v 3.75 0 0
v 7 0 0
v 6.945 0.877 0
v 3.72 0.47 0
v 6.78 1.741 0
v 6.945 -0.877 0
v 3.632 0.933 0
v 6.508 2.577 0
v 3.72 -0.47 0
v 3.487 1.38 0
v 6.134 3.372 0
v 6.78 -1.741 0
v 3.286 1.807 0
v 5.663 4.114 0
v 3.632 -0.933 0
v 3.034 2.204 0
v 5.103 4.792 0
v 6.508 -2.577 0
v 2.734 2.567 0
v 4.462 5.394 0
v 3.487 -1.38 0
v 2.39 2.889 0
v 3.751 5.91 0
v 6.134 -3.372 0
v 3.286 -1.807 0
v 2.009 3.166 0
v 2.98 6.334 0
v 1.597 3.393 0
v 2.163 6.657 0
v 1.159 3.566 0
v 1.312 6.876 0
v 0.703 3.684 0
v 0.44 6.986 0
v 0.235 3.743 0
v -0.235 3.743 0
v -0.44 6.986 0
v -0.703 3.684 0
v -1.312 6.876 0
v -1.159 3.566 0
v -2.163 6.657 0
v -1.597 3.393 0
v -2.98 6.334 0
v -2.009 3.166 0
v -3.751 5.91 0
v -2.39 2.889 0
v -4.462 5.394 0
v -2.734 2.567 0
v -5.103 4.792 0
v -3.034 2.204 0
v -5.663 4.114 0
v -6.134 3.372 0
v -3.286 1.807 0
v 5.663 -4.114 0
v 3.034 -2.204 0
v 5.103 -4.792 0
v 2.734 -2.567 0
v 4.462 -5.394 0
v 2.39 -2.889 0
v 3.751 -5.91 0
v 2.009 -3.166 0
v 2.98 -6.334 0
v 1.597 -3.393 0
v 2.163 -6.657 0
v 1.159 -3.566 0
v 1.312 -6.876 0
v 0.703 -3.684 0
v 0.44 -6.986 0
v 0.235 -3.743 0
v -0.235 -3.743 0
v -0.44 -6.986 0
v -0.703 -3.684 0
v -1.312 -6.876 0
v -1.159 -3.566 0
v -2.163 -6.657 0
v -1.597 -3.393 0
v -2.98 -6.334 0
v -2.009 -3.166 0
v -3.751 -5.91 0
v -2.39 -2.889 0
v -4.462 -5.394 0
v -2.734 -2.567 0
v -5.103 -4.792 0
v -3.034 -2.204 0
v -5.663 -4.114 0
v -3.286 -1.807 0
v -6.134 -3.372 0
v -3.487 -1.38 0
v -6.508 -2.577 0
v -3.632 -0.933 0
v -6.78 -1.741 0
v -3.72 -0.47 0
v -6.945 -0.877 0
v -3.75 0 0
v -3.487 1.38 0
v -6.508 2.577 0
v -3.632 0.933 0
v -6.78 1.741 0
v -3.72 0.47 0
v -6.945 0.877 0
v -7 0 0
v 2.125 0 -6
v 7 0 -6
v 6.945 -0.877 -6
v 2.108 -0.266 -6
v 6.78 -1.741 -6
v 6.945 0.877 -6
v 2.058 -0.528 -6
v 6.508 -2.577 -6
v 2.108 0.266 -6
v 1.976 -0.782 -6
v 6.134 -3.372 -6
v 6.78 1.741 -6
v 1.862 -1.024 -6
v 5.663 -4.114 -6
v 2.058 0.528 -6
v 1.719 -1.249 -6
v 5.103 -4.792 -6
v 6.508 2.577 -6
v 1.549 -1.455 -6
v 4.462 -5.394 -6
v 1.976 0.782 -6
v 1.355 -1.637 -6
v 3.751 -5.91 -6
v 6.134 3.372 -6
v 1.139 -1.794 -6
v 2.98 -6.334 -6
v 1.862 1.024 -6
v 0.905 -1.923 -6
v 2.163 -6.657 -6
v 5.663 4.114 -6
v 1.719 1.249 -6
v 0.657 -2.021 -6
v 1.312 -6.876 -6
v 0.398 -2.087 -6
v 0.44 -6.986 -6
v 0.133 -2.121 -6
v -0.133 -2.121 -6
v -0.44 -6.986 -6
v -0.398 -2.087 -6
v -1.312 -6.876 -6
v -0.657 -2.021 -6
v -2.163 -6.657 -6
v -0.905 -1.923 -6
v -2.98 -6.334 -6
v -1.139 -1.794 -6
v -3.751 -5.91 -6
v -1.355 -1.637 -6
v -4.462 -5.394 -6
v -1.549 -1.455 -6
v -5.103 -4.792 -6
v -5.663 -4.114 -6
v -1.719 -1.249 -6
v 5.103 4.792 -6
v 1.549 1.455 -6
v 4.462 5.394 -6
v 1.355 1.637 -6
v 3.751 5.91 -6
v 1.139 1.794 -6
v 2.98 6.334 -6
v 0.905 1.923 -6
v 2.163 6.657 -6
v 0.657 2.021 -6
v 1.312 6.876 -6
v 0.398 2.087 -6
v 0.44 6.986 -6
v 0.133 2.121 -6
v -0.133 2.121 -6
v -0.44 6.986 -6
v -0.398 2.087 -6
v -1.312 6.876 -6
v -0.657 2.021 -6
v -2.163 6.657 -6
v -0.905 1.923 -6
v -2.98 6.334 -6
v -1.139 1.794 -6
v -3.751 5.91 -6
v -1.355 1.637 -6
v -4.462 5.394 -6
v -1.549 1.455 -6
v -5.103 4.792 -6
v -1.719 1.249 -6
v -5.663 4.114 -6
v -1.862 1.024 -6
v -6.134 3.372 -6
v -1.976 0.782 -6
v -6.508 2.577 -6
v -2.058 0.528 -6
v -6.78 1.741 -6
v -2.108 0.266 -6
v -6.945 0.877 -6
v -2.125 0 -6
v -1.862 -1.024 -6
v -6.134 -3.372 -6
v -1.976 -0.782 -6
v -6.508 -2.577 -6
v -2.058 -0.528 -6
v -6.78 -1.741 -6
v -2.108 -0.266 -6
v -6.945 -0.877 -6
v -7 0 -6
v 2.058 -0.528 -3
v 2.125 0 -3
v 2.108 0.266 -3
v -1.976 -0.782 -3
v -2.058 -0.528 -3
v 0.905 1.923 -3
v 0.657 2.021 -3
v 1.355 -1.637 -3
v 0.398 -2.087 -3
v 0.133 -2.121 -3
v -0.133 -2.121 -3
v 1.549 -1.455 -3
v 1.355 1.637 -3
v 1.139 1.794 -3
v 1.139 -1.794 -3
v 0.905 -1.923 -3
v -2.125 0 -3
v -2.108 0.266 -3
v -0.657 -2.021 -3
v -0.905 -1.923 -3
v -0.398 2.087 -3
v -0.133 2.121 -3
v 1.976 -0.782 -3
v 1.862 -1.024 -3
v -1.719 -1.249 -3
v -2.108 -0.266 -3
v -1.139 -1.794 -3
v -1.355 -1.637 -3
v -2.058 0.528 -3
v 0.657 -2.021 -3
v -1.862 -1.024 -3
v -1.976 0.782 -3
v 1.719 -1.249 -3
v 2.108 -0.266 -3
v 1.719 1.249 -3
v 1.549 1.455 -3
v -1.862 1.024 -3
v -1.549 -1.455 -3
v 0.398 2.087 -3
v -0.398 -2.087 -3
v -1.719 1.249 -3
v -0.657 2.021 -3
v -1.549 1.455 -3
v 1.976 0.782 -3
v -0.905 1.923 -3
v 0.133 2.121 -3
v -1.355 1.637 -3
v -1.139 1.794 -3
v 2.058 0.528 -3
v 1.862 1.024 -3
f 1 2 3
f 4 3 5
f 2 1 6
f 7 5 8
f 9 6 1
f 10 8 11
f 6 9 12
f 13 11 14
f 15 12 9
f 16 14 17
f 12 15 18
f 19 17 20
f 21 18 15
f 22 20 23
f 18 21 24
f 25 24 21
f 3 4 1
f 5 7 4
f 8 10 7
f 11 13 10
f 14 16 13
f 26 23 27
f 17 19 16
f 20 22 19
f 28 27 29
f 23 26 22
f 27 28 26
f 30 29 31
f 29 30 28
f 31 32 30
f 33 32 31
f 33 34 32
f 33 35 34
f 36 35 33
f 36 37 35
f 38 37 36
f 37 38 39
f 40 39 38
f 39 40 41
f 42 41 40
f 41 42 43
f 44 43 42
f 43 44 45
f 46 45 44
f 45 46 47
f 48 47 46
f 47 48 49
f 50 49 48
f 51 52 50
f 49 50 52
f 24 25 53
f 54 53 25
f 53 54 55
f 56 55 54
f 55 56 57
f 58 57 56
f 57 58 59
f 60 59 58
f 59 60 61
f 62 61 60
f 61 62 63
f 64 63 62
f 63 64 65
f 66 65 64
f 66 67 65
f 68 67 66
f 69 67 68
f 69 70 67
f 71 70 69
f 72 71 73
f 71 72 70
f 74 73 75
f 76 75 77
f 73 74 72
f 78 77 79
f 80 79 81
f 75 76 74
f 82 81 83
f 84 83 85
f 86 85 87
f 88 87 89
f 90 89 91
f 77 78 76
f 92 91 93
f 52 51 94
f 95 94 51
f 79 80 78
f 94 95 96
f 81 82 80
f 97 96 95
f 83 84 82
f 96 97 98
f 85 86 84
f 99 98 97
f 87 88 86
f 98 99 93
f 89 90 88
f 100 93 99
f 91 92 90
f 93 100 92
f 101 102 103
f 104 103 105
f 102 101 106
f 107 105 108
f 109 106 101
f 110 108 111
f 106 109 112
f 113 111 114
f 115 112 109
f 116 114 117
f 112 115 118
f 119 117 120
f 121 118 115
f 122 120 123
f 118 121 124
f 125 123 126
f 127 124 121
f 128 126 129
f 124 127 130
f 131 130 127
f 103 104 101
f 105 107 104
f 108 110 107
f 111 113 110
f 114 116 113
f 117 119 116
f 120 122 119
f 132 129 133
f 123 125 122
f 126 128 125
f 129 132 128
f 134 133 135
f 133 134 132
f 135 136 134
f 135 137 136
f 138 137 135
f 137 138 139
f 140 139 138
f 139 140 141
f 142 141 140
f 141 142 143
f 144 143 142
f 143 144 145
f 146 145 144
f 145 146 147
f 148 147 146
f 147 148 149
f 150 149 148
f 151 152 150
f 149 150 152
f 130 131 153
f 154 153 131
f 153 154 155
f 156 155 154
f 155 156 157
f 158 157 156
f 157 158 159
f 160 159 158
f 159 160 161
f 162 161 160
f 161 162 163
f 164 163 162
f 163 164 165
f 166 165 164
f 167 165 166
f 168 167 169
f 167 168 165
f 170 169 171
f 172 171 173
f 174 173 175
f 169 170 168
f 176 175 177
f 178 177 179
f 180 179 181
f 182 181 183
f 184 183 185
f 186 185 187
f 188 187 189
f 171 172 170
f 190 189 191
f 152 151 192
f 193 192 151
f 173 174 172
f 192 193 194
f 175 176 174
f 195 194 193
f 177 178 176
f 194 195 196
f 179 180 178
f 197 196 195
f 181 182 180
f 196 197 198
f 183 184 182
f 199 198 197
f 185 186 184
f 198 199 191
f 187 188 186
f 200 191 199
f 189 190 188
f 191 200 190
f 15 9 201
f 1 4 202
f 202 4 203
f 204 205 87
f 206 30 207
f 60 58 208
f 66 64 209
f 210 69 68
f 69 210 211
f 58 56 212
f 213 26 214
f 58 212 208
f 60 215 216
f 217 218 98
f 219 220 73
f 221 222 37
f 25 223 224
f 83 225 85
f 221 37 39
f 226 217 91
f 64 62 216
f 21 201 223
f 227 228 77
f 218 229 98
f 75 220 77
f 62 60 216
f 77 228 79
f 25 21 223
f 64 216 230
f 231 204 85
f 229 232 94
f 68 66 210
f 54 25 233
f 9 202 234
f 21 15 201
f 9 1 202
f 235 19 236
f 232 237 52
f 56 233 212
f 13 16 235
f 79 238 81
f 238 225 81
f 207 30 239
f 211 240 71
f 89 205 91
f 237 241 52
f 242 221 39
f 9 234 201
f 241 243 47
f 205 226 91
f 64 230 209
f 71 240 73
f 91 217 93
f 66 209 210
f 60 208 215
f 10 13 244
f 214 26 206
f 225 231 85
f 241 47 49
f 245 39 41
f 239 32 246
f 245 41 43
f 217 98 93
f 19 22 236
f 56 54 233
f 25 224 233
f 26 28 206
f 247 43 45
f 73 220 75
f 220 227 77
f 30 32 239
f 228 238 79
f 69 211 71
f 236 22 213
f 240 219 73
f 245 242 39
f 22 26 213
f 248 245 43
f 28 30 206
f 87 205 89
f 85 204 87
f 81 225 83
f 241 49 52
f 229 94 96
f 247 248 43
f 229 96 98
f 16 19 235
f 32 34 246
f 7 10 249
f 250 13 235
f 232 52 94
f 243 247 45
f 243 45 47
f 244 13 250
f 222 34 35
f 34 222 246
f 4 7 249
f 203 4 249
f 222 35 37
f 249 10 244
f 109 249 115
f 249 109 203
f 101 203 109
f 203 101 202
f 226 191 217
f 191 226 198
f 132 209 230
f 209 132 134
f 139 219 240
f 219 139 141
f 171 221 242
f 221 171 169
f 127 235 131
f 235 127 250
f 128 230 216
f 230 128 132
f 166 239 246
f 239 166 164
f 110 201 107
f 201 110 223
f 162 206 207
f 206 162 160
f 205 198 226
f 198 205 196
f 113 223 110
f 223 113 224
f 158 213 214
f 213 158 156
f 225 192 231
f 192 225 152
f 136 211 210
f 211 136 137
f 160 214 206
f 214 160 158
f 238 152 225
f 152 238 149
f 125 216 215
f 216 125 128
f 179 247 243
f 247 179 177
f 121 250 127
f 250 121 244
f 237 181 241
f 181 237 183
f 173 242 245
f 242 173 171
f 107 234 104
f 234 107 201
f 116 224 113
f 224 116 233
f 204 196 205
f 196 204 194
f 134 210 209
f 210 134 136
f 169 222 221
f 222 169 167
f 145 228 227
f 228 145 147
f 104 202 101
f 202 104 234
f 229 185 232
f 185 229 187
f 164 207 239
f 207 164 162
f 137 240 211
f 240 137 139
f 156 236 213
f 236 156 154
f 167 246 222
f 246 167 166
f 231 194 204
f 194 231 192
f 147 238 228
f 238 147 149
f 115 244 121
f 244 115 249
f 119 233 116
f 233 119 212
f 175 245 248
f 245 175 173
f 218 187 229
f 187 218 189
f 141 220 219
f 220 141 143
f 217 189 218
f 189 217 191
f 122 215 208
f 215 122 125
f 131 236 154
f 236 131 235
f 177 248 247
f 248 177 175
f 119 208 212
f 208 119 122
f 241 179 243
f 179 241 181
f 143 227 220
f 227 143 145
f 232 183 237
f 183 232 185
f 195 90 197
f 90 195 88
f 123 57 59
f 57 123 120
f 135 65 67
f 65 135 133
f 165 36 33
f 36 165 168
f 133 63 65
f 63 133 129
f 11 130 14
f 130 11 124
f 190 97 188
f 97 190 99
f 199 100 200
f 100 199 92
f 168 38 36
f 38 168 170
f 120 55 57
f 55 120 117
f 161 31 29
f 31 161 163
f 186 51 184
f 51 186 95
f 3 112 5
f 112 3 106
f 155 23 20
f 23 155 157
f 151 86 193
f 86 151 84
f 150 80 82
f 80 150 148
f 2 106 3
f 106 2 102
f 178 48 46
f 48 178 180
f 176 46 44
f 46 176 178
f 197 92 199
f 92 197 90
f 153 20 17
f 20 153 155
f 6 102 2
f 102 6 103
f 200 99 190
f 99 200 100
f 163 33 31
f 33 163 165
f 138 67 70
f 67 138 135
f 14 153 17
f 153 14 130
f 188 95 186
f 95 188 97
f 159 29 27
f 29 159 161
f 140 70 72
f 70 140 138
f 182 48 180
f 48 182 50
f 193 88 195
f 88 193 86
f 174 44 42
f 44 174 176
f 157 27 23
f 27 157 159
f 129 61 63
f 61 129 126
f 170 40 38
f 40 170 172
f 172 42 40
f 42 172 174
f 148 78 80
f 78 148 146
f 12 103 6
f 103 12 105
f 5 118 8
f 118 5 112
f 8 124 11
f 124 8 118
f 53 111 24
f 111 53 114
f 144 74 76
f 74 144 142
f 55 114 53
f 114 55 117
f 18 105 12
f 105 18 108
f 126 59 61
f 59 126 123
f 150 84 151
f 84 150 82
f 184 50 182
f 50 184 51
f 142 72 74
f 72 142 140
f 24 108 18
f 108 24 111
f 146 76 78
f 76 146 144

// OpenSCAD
$fn = 50;


difference() {
	union() {
		translate(v = [0, 0, -6.0000000000]) {
			cylinder(h = 6, r = 7.0000000000);
		}
		cylinder(h = 0, r = 16.0000000000);
	}
	union() {
		translate(v = [0, 0, 0]) {
			rotate(a = [0, 0, 0]) {
				difference() {
					union() {
						#translate(v = [0, 0, -6.0000000000]) {
							cylinder(h = 6, r = 2.0000000000);
						}
						#translate(v = [0, 0, -3]) {
							cylinder(h = 3, r1 = 2.1250000000, r2 = 3.7500000000);
						}
						#translate(v = [0, 0, -6.0000000000]) {
							cylinder(h = 6, r = 2.1250000000);
						}
						#translate(v = [0, 0, -6.0000000000]) {
							cylinder(h = 6, r = 2.0000000000);
						}
					}
					union();
				}
			}
		}
	}
}
